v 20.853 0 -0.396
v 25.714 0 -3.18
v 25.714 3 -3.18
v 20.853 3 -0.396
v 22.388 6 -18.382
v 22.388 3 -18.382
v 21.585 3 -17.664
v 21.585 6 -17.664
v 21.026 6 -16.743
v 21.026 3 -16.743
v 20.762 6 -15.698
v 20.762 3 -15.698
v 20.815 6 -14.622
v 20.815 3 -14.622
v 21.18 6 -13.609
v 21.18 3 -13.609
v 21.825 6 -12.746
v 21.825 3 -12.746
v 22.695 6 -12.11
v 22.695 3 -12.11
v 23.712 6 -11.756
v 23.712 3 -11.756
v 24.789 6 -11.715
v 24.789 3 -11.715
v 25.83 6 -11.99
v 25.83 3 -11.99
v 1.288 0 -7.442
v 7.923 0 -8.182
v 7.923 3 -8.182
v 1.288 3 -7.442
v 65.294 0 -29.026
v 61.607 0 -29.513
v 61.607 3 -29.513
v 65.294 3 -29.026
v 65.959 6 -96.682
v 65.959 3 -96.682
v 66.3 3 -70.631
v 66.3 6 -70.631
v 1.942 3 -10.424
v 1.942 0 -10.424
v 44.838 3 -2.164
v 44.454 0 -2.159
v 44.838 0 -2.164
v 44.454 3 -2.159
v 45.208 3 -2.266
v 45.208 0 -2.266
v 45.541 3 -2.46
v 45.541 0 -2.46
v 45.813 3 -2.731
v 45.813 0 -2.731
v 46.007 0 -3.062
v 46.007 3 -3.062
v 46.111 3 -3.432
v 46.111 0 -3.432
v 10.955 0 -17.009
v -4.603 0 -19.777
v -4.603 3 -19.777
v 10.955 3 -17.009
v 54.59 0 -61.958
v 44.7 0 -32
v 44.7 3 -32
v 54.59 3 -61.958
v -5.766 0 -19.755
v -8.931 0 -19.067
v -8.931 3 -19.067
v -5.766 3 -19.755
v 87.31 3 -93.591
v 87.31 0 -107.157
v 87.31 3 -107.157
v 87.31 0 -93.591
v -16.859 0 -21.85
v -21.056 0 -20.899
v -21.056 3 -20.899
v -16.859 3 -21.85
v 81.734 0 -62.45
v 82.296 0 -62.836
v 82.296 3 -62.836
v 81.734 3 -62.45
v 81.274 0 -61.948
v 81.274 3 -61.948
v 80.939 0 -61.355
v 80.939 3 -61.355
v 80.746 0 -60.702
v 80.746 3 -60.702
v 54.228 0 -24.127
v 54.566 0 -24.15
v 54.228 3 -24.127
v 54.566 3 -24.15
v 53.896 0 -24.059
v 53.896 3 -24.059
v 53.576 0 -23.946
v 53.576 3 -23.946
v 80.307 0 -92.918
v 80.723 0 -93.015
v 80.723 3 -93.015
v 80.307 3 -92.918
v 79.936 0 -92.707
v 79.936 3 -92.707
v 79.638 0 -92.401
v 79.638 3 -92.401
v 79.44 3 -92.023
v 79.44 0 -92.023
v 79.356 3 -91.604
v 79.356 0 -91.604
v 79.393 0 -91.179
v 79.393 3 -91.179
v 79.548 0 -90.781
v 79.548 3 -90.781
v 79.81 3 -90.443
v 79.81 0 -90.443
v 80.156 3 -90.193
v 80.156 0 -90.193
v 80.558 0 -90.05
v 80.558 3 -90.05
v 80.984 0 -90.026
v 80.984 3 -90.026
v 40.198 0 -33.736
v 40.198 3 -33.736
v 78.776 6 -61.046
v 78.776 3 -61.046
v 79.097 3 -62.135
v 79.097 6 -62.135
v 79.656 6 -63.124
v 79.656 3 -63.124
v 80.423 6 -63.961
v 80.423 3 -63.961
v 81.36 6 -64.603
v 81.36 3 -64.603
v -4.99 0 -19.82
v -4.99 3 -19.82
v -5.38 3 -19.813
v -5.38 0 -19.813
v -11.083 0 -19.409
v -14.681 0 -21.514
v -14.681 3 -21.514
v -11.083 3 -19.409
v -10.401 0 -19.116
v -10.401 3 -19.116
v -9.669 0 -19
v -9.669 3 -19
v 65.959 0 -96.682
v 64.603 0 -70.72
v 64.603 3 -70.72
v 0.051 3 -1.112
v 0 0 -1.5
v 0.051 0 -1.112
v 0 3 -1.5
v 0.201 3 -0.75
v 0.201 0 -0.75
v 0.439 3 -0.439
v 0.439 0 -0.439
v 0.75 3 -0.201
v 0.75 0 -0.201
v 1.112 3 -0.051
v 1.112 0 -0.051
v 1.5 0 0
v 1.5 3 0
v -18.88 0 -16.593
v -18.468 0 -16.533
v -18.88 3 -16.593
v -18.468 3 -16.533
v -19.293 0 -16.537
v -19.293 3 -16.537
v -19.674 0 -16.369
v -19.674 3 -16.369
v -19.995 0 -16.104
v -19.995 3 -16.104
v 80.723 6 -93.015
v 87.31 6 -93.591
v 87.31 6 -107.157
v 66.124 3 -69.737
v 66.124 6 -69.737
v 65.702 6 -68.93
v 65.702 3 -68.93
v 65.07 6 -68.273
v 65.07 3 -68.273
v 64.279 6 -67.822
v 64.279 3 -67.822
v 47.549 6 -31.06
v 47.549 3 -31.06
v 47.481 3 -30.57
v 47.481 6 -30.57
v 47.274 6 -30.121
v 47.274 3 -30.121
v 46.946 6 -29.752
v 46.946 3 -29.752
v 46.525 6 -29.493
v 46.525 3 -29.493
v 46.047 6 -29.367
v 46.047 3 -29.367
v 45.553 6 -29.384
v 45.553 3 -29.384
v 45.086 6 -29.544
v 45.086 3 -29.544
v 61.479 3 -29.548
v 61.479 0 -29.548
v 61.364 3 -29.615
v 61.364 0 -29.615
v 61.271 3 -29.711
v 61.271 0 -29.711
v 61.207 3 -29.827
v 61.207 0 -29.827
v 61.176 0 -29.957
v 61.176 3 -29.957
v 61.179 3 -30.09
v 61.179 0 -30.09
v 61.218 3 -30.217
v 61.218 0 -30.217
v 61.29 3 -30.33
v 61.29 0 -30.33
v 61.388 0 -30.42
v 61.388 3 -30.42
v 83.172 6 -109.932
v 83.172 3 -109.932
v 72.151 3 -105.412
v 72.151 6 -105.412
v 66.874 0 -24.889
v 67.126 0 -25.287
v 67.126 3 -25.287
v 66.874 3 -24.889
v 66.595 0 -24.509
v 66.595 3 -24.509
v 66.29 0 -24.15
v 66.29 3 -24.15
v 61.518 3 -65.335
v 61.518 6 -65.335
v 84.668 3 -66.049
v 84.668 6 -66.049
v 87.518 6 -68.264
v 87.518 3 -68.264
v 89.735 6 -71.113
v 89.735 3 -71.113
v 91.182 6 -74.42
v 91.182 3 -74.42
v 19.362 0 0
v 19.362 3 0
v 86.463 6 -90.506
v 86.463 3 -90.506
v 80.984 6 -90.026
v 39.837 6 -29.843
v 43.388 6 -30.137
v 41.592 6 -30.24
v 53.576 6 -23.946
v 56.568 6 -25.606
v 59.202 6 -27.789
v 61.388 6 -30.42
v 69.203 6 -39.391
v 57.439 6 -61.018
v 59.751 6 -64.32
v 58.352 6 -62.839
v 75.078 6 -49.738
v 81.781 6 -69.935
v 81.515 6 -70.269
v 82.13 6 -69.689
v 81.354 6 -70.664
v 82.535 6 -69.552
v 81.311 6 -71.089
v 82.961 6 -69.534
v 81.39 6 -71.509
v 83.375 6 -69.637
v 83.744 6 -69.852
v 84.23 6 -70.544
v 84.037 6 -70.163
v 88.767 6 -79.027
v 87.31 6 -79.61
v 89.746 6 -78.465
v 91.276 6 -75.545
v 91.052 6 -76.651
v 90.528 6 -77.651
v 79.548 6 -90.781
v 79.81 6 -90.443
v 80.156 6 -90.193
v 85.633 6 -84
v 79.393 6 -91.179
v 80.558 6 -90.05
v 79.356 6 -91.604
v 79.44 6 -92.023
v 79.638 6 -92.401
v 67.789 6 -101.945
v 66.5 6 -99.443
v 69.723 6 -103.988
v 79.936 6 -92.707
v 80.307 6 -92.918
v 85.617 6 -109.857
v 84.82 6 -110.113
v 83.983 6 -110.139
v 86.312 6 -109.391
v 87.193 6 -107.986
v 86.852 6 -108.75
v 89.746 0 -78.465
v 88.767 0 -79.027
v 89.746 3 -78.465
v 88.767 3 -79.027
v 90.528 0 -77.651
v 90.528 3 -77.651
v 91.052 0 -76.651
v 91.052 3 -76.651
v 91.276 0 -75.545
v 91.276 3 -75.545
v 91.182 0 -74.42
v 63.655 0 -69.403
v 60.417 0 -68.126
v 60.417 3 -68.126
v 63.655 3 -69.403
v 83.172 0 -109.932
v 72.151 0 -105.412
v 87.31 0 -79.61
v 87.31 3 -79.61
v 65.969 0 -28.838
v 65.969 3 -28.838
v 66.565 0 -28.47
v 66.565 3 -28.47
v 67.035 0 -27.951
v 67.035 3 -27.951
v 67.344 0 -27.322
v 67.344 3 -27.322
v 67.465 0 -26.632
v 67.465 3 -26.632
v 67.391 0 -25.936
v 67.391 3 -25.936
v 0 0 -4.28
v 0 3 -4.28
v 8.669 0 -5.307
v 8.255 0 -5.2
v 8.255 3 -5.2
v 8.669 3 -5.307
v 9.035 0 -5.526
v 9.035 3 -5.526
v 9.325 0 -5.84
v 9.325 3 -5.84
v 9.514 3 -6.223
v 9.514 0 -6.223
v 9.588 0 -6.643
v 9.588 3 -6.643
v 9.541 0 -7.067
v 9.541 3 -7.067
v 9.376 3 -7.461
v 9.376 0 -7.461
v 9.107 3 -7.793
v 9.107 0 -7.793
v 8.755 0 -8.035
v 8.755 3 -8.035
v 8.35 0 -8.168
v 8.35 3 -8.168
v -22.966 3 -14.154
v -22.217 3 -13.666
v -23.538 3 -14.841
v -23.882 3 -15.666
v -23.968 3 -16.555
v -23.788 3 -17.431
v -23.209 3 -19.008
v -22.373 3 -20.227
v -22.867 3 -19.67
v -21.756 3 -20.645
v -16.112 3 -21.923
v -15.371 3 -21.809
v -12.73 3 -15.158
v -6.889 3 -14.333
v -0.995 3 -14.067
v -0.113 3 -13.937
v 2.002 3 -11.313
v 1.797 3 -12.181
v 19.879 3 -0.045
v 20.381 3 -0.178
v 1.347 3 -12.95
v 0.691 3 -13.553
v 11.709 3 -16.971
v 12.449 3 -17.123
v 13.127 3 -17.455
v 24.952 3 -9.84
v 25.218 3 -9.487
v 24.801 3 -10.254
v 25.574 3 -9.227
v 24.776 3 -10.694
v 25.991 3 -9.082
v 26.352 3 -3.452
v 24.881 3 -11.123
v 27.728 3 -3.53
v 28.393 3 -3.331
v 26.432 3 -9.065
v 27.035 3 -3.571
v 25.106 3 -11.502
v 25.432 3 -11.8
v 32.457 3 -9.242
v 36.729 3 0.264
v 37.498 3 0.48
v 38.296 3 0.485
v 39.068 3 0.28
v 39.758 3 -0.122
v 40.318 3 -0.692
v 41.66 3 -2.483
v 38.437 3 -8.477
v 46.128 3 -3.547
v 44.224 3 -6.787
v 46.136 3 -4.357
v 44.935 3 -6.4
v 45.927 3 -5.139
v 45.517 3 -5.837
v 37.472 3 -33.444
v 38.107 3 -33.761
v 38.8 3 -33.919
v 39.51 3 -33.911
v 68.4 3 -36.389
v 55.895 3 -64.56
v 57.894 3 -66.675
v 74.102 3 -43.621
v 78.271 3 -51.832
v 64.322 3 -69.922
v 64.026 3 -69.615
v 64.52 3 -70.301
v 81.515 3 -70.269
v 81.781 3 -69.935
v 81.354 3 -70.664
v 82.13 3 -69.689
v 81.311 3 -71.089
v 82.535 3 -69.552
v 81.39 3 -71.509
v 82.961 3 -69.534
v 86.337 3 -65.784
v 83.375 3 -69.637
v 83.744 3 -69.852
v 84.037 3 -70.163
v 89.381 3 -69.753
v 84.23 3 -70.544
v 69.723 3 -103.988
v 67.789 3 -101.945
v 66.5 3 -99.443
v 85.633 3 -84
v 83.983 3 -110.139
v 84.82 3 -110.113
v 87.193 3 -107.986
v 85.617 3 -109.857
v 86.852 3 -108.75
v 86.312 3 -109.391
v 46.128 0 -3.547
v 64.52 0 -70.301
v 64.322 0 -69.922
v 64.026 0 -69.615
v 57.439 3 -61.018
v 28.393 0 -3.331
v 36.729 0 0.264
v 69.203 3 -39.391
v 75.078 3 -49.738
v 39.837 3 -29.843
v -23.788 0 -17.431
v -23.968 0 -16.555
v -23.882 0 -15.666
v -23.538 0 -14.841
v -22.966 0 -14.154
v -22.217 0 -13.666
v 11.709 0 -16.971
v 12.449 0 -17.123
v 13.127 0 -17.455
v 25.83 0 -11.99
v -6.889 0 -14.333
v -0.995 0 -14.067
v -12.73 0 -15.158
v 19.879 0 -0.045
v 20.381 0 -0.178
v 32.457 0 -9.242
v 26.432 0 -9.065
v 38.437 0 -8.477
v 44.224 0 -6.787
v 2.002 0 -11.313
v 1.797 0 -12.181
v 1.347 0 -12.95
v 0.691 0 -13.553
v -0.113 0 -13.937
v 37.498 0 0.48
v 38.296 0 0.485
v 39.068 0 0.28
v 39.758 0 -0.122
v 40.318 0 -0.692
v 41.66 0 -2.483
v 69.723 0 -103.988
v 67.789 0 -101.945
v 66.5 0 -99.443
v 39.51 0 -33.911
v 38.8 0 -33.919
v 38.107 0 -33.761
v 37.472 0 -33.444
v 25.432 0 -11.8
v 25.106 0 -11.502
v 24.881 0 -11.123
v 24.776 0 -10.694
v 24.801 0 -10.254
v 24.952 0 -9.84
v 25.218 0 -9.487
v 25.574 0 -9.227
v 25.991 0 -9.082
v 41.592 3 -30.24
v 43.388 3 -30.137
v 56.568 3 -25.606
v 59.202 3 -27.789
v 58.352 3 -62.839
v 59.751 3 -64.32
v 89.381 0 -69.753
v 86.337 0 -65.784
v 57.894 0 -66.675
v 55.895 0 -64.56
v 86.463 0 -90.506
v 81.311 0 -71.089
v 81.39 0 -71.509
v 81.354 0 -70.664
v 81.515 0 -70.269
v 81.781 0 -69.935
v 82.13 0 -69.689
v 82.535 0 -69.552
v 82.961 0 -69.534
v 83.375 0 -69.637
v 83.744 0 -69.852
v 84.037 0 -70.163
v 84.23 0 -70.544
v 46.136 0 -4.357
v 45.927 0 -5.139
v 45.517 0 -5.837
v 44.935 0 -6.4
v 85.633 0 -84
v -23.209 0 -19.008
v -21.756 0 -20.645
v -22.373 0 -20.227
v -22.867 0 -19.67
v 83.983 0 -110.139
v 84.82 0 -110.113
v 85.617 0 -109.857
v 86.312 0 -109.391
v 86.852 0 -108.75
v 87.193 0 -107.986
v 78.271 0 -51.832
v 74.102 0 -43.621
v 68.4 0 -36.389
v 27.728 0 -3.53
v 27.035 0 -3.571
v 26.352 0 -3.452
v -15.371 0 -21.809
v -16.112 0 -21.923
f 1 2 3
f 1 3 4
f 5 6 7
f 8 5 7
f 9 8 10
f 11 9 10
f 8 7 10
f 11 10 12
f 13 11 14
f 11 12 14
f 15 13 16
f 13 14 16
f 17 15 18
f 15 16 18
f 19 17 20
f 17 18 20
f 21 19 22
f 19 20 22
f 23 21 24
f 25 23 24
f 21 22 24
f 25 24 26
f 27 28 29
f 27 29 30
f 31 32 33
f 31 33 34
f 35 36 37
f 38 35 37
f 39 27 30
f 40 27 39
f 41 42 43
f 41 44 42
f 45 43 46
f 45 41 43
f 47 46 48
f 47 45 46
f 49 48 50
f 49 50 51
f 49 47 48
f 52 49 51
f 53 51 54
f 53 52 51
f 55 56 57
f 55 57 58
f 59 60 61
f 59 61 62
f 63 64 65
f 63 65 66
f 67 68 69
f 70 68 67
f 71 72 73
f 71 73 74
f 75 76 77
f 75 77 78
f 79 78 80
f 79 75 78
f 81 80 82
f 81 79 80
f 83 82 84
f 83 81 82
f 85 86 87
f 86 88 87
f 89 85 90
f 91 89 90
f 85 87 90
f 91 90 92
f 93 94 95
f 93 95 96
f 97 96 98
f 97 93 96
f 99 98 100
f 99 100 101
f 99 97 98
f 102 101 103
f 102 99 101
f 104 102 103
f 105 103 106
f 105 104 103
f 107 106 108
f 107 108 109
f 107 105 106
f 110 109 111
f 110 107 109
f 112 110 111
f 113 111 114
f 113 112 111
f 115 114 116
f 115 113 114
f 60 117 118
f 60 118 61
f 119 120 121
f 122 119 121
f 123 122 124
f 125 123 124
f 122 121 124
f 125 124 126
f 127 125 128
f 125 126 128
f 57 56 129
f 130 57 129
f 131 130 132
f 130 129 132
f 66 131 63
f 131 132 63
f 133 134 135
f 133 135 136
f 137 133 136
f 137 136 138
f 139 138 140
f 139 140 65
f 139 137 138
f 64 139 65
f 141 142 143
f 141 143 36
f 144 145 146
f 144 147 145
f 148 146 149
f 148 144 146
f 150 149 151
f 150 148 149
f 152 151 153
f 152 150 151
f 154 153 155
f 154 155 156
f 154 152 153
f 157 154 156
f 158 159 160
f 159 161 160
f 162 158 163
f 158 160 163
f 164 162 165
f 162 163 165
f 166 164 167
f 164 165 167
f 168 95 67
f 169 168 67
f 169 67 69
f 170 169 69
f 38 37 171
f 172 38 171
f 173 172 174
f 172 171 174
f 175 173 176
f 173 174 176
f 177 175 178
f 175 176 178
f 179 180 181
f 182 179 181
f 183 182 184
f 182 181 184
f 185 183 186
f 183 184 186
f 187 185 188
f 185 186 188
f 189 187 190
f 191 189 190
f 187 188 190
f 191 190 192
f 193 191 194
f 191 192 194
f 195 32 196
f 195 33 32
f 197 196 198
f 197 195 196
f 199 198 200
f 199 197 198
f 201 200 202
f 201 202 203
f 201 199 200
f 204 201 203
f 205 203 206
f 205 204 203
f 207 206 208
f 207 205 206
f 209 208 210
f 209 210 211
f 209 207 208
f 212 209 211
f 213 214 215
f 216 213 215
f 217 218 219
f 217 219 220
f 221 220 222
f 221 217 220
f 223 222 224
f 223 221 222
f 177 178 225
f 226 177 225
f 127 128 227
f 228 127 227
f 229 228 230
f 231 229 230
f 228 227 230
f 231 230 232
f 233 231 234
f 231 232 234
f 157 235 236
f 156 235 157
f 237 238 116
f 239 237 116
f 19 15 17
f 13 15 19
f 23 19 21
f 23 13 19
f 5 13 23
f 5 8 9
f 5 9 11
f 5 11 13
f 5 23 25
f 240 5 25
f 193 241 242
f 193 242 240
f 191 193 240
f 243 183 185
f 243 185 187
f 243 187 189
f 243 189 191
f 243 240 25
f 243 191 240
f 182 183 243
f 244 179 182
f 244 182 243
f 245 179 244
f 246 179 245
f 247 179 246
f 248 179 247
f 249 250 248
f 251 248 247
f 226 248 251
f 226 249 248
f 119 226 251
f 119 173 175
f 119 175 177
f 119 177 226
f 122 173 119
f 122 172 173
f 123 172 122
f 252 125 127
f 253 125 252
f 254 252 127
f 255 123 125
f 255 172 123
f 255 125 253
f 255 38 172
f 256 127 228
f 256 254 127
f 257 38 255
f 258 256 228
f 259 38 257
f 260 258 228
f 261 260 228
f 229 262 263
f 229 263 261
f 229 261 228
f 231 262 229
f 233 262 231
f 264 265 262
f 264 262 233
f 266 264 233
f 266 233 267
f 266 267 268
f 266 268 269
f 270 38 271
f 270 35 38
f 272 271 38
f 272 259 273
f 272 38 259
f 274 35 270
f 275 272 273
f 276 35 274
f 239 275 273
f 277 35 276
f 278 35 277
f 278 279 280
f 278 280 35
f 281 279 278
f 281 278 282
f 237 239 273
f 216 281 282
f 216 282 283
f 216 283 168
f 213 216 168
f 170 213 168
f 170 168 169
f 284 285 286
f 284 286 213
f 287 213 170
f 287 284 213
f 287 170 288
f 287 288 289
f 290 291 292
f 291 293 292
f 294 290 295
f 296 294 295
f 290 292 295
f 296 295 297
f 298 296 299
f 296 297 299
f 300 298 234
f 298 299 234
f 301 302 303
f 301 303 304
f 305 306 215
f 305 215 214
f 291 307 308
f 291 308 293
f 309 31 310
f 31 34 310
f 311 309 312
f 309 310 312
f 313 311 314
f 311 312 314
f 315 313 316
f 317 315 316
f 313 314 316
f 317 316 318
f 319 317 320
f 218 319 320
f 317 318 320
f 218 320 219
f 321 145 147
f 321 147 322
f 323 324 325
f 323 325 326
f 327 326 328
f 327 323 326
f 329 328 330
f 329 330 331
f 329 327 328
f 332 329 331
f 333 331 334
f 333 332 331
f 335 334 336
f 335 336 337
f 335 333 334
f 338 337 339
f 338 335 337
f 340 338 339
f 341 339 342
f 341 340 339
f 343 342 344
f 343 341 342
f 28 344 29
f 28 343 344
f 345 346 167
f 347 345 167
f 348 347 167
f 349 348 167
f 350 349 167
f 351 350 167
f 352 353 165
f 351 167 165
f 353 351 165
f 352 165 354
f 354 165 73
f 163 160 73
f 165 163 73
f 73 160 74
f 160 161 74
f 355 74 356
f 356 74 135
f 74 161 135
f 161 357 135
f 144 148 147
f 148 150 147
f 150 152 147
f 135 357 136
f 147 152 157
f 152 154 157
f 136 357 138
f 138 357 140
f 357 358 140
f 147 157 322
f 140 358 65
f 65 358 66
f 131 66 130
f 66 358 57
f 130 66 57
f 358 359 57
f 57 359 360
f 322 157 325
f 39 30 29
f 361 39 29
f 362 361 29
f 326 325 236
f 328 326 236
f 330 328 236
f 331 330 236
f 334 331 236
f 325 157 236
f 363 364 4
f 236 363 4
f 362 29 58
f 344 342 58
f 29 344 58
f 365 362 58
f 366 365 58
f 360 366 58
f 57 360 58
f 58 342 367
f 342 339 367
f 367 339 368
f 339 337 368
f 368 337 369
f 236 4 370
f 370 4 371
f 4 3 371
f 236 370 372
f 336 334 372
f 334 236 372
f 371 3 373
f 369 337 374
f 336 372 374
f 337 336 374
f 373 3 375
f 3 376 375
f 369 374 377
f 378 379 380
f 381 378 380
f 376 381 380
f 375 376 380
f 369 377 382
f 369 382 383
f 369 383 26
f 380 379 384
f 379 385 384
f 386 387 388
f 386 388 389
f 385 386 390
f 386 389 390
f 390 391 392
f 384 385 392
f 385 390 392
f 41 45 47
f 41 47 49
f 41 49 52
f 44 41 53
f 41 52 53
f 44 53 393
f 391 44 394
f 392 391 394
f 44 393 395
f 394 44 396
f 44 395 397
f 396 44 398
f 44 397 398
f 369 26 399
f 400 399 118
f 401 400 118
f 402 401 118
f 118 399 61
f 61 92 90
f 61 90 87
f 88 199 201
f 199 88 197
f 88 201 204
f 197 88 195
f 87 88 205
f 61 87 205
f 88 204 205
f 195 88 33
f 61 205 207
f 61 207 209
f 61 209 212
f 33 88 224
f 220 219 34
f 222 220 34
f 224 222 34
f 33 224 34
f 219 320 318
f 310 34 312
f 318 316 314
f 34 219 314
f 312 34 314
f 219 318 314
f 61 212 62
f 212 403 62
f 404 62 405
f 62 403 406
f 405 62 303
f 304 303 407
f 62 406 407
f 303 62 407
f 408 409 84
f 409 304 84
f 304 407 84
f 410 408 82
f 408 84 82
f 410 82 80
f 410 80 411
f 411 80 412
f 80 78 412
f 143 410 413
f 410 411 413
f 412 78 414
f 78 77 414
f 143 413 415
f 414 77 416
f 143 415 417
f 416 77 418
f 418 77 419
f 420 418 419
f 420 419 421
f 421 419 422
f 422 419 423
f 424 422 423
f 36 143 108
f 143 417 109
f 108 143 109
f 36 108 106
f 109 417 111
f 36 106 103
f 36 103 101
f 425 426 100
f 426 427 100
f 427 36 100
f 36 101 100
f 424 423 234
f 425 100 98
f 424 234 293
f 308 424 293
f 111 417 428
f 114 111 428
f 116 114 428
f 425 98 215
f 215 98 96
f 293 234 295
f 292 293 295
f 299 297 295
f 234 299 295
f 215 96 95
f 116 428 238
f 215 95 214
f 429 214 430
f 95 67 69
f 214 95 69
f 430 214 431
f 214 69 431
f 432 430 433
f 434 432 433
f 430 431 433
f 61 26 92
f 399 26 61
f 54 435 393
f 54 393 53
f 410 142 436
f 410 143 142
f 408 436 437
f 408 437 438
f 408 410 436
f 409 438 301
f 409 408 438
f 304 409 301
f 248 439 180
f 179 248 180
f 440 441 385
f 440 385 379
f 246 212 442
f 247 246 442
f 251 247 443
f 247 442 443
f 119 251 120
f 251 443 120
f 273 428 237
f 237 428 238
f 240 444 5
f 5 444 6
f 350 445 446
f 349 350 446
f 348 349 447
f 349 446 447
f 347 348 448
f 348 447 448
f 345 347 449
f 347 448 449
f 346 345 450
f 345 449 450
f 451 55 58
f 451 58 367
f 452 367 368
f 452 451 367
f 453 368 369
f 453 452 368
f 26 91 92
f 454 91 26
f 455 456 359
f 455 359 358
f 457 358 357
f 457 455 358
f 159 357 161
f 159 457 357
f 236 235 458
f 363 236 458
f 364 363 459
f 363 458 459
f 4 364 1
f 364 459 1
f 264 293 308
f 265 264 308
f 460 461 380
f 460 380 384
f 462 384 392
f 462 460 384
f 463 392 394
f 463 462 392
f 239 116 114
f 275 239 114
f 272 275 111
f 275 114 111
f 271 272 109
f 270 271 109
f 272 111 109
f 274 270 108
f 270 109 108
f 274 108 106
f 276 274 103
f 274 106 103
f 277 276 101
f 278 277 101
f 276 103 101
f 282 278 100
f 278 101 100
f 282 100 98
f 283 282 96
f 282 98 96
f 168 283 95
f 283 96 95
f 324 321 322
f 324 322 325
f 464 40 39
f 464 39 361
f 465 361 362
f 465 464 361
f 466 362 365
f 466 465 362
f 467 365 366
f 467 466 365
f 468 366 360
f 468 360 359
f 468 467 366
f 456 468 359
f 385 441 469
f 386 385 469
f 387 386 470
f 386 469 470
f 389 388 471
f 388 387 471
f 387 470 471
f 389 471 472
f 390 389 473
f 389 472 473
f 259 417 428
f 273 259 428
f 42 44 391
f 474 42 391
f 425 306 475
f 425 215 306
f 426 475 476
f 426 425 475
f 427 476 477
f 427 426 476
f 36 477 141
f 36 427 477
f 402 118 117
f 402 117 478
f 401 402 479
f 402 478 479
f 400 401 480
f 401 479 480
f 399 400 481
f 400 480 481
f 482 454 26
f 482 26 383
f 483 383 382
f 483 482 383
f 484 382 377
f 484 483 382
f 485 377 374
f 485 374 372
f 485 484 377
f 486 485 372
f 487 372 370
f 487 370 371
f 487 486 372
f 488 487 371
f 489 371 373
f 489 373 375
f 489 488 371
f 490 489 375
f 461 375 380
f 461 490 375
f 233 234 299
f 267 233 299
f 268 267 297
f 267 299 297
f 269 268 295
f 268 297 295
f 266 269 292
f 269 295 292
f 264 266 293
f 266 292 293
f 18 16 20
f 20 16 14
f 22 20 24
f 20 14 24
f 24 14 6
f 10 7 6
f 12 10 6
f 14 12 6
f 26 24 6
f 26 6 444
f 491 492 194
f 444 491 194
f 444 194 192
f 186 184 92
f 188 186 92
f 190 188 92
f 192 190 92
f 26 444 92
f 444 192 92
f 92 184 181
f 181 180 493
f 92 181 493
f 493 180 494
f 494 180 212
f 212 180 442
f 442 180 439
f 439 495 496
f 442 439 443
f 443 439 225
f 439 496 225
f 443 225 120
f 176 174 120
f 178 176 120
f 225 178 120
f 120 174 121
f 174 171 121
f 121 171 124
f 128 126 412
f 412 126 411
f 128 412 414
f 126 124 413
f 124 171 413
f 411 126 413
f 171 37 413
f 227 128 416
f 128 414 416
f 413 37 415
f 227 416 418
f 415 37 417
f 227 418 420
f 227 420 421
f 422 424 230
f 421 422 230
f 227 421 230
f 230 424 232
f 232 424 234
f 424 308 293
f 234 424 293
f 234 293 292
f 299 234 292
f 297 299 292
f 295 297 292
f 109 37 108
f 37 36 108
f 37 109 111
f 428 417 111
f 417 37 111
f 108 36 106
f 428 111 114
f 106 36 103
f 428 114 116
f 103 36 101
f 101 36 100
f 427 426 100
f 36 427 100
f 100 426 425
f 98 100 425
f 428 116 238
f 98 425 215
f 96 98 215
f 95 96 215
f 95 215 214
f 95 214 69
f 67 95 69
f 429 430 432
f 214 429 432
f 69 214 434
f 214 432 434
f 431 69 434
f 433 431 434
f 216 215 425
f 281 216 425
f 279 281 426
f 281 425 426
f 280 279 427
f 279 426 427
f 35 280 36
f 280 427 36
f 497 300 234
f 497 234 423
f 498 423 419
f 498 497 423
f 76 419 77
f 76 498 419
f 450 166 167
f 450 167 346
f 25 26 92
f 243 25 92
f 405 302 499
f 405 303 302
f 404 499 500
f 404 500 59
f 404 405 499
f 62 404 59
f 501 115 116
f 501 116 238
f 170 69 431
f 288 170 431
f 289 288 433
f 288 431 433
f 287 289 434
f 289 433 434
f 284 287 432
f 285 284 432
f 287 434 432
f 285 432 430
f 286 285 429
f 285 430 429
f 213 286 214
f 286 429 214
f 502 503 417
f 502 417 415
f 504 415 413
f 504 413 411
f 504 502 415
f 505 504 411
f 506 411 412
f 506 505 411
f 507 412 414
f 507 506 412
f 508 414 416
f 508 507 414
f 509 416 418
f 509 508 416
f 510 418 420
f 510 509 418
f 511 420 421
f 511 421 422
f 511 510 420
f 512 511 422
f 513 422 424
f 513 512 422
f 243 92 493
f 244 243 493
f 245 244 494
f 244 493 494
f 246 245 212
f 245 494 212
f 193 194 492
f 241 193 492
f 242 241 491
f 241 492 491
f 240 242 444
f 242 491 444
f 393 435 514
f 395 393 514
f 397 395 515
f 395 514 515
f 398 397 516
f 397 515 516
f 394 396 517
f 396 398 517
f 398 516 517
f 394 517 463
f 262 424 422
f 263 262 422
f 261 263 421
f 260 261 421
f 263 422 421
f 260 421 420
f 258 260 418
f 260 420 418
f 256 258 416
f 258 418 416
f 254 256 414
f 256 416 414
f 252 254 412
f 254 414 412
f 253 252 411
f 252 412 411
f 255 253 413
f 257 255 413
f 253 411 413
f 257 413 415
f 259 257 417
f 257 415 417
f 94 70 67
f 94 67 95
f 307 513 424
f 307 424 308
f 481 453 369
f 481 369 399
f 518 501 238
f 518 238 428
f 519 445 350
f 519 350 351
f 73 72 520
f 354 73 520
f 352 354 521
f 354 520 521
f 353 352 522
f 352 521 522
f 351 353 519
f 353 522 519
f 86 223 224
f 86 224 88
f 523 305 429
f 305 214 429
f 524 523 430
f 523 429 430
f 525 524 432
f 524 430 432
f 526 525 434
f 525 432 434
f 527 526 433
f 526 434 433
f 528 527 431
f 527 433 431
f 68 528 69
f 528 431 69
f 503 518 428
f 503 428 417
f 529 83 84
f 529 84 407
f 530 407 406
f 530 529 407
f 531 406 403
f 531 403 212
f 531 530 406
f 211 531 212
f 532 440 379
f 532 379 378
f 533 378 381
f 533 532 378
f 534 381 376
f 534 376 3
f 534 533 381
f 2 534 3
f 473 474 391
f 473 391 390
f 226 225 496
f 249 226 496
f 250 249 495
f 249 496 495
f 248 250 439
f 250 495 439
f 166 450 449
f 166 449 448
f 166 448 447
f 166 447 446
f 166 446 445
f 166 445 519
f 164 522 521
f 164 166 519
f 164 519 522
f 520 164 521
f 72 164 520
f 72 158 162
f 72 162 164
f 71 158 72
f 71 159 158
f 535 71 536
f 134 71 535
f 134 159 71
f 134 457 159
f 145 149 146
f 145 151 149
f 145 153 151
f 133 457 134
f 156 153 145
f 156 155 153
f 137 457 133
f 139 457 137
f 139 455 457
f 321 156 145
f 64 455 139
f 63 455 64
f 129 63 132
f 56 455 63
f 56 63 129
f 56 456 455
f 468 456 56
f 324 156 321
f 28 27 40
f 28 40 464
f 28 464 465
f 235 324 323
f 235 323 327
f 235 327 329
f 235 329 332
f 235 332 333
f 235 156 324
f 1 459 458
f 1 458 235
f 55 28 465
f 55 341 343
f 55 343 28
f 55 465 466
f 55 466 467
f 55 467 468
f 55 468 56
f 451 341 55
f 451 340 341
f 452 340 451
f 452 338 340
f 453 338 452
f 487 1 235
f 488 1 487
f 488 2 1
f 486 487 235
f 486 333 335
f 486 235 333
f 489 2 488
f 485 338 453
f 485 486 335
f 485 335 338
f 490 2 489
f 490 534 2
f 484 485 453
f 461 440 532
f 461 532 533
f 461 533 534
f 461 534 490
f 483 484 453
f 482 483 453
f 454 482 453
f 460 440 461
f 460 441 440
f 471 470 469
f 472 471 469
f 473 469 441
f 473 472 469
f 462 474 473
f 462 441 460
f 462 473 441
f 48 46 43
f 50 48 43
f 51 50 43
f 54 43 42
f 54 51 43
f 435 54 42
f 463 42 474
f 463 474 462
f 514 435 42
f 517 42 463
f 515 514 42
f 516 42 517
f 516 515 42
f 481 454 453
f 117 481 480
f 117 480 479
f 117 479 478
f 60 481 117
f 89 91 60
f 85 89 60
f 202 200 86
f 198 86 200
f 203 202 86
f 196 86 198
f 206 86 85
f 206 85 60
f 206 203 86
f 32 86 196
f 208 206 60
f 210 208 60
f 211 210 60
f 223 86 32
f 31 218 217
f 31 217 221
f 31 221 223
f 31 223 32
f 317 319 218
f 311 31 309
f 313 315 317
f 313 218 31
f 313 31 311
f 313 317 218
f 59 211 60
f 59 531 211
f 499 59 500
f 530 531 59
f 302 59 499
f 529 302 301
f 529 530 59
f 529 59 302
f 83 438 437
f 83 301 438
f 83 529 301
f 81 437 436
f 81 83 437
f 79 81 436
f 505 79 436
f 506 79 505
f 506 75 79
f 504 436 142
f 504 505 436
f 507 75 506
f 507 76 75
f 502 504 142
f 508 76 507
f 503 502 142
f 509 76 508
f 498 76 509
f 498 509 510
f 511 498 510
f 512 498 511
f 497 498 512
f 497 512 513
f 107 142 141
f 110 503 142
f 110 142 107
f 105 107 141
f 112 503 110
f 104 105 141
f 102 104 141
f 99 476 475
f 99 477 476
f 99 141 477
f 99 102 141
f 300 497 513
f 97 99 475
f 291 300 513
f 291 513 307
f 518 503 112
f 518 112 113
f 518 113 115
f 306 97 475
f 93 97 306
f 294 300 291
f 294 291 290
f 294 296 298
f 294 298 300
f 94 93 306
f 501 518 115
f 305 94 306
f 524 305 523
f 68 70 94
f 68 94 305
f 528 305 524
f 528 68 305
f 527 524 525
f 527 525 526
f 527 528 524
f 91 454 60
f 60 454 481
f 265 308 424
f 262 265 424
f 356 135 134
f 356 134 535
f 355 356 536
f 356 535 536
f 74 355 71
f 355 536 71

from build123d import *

# Parameters (mm, degrees)
BOSS_EXTRUDE1_DEPTH = 3
FILLET1_R           = 3
FILLET2_R           = 1.5
FILLET3_R           = 10
FILLET4_R           = 3
FILLET5_R           = 4
FILLET6_R           = 2.5
FILLET7_R           = 0.5
BOSS_EXTRUDE2_DEPTH = 3


with BuildPart() as part:
    # Sketch3 → Boss-Extrude1 (new body)
    with BuildSketch(Plane(origin=(0, 0, 0), x_dir=(1, 0, 0), z_dir=(0, 1, 0))):
        with BuildLine():
            Line((7.923093171, 8.181542538), (1.28839884, 7.442154357))
            Line((1.28839884, 7.442154357), (2.76822933, 14.19))
            ThreePointArc((2.76822933, 14.19), (-8.413807268, 14.494015924), (-19.359710867, 16.8))
            Line((-19.359710867, 16.8), (-22.216794933, 13.666296862))
            Line((-22.216794933, 13.666296862), (-24.820279869, 14.62298821))
            Line((-24.820279869, 14.62298821), (-22.646481841, 20.53863742))
            Line((-22.646481841, 20.53863742), (-15.703804617, 22.111794774))
            Line((-15.703804617, 22.111794774), (-10.073302156, 18.818482014))
            Line((-10.073302156, 18.818482014), (-5.186450964, 19.880840969))
            Line((-5.186450964, 19.880840969), (12.13, 16.8))
            Line((12.13, 16.8), (38.76, 34.29))
            Line((38.76, 34.29), (44.7, 32))
            Line((44.7, 32), (56.058554748, 66.4069852))
            Line((56.058554748, 66.4069852), (64.552315124, 69.756868371))
            Line((64.552315124, 69.756868371), (66.29, 103.00790875))
            Line((66.29, 103.00790875), (87.31, 111.63))
            Line((87.31, 111.63), (87.31, 93.591357519))
            Line((87.31, 93.591357519), (80.722672152, 93.01504101))
            ThreePointArc((80.722672152, 93.01504101), (79.359113719, 91.390015348), (80.984139381, 90.026456915))
            Line((80.984139381, 90.026456915), (86.46321022, 90.505813501))
            Line((86.46321022, 90.505813501), (85.632866314, 84))
            Line((85.632866314, 84), (81.389705108, 71.508585308))
            ThreePointArc((81.389705108, 71.508585308), (82.327545423, 69.605835839), (84.230294892, 70.543676154))
            Line((84.230294892, 70.543676154), (87.31, 79.61))
            Line((87.31, 79.61), (91.618486592, 77.887634392))
            ThreePointArc((91.618486592, 77.887634392), (88.600013238, 68.48894743), (80.984139381, 62.208424889))
            ThreePointArc((80.984139381, 62.208424889), (74.158506271, 43.709858628), (60.297831214, 29.686025056))
            Line((60.297831214, 29.686025056), (68.03871852, 28.66301442))
            ThreePointArc((68.03871852, 28.66301442), (67.586257486, 26.243028794), (66.29, 24.15))
            Line((66.29, 24.15), (54.05, 24.15))
            Line((54.05, 24.15), (25.830040494, 11.99))
            ThreePointArc((25.830040494, 11.99), (24.800734775, 10.253880031), (26.431506195, 9.064692331))
            ThreePointArc((26.431506195, 9.064692331), (36.664028635, 8.803570476), (46.46571567, 5.854056721))
            Line((46.46571567, 5.854056721), (45.9, 1.991540554))
            Line((45.9, 1.991540554), (41.660045255, 2.482673431))
            Line((41.660045255, 2.482673431), (38.9, -1.2))
            Line((38.9, -1.2), (27.015518097, 3.924692331))
            Line((27.015518097, 3.924692331), (20.16, 0))
            Line((20.16, 0), (0, 0))
            Line((0, 0), (0, 4.28))
            Line((0, 4.28), (8.255364291, 5.2))
            ThreePointArc((8.255364291, 5.2), (9.58, 6.856906829), (7.923093171, 8.181542538))
        make_face()
    extrude(amount=BOSS_EXTRUDE1_DEPTH)

    # Fillet1
    # the kernel refuses this fillet: 3 mm, written as the material it adds along each edge
    with BuildSketch(Plane(origin=(80.984139381, 0, -62.208424889), x_dir=(0.9022478681487618, 0, -0.4312177923289046), z_dir=(0, 1, 0))) as fillet1_piece_1:
        with BuildLine():
            CenterArc((1.578679862, -2.997421373), FILLET1_R, 92.37575888, 52.157589609)
            ThreePointArc((-0.864680258, -1.256734347), (-0.427200708, -0.631903288), (0, 0))
            ThreePointArc((0, 0), (0.72716053, -0.015077949), (1.45432106, 0))
        make_face()
    extrude(amount=3)
    with BuildSketch(Plane(origin=(27.015518097, 0, -3.924692331), x_dir=(0.9182659150547935, 0, 0.39596427774305953), z_dir=(0, 1, 0))) as fillet1_piece_2:
        with BuildLine():
            CenterArc((FILLET1_R * 0.49985366711, -FILLET1_R), FILLET1_R, 90, 53.116686758)
            Line((-FILLET1_R * 0.300005823165, -FILLET1_R * 0.399812699386), (0, 0))
            Line((0, 0), (FILLET1_R * 0.49985366711, 0))
        make_face()
    extrude(amount=3)
    with BuildSketch(Plane(origin=(12.13, 0, -16.8), x_dir=(-0.9845393680489544, 0, -0.17516344584919966), z_dir=(0, 1, 0))) as fillet1_piece_3:
        with BuildLine():
            CenterArc((FILLET1_R * 0.397788634748, -FILLET1_R), FILLET1_R, 90, 43.384200988)
            Line((-FILLET1_R * 0.289098500769, -FILLET1_R * 0.273235895863), (0, 0))
            Line((0, 0), (FILLET1_R * 0.397788634748, 0))
        make_face()
    extrude(amount=3)
    with BuildSketch(Plane(origin=(-10.073302156, 0, -18.818482014), x_dir=(-0.863187603129405, 0, -0.5048833150379528), z_dir=(0, 1, 0))) as fillet1_piece_4:
        with BuildLine():
            CenterArc((FILLET1_R * 0.389766900576, -FILLET1_R), FILLET1_R, 90, 42.58838059)
            Line((-FILLET1_R * 0.286959776942, -FILLET1_R * 0.263765659633), (0, 0))
            Line((0, 0), (FILLET1_R * 0.389766900576, 0))
        make_face()
    extrude(amount=3)
    with BuildSketch(Plane(origin=(2.76822933, 0, -14.19), x_dir=(-0.21421340809022724, 0, 0.9767868835085624), z_dir=(0, 1, 0))) as fillet1_piece_5:
        with BuildLine():
            CenterArc((3.855271405, -3), FILLET1_R, 90, 102.505548925)
            ThreePointArc((0.926446282, -3.649602493), (0.490902504, -1.81777488), (0, 0))
            Line((0, 0), (3.855271405, 0))
        make_face()
    extrude(amount=3)
    # the kernel refuses this fillet: 3 mm, written as the material it takes off along each edge
    with BuildSketch(Plane(origin=(-24.820279869, -7.478630688, -14.62298821), x_dir=(0.9386336815677853, 0, 0.3449156590044952), z_dir=(0, 1, 0))) as fillet1_2_piece_1:
        with BuildLine():
            CenterArc((3, 2.991452275), FILLET1_R, 180, 85.673811508)
            Line((0, 2.991452275), (0, 0))
            Line((0, 0), (2.773696477, 0))
        make_face()
    extrude(amount=17.957261376, mode=Mode.SUBTRACT)
    with BuildSketch(Plane(origin=(20.16, -1.994934097, 0), x_dir=(0.8678473261649016, 0, -0.4968309757537575), z_dir=(0, 1, 0))) as fillet1_2_piece_2:
        with BuildLine():
            CenterArc((FILLET1_R * 0.265991212876, FILLET1_R), FILLET1_R, 240.209440415, 29.790559585)
            Line((-FILLET1_R * 0.230839762878, FILLET1_R * 0.132152673835), (0, 0))
            Line((0, 0), (FILLET1_R * 0.265991212876, 0))
        make_face()
    extrude(amount=6.989868193, mode=Mode.SUBTRACT)
    with BuildSketch(Plane(origin=(46.46571567, -6.070952348, -5.854056721), x_dir=(-0.9233291277987619, 0, -0.38400953342121286), z_dir=(0, 1, 0))) as fillet1_2_piece_3:
        with BuildLine():
            CenterArc((2.333722575, 2.99850626), FILLET1_R, 194.249797413, 77.558344276)
            Line((-0.573972765, 2.260056662), (0, 0))
            ThreePointArc((0, 0), (1.21419047, -0.019160317), (2.428380939, 0))
        make_face()
    extrude(amount=15.141904695, mode=Mode.SUBTRACT)
    with BuildSketch(Plane(origin=(38.9, -5.909950036, 1.2), x_dir=(0.5997274231965581, 0, -0.8002043600643629), z_dir=(0, 1, 0))) as fillet1_2_piece_4:
        with BuildLine():
            CenterArc((FILLET1_R * 0.78799333809, FILLET1_R), FILLET1_R, 193.524251091, 76.475748909)
            Line((-FILLET1_R * 0.184277686804, FILLET1_R * 0.766143090435), (0, 0))
            Line((0, 0), (FILLET1_R * 0.78799333809, 0))
        make_face()
    extrude(amount=14.819900071, mode=Mode.SUBTRACT)
    with BuildSketch(Plane(origin=(38.76, -3.852720436, -34.29), x_dir=(-0.8358453893738872, 0, 0.5489649215226915), z_dir=(0, 1, 0))) as fillet1_2_piece_5:
        with BuildLine():
            CenterArc((FILLET1_R * 0.513696058133, FILLET1_R), FILLET1_R, 215.621225969, 54.378774031)
            Line((-FILLET1_R * 0.299188992069, FILLET1_R * 0.417575846005), (0, 0))
            Line((0, 0), (FILLET1_R * 0.513696058133, 0))
        make_face()
    extrude(amount=10.705440872, mode=Mode.SUBTRACT)
    with BuildSketch(Plane(origin=(-5.186450964, -1.481839662, -19.880840969), x_dir=(-0.9771763639228005, 0, 0.2124296443310458), z_dir=(0, 1, 0))) as fillet1_2_piece_6:
        with BuildLine():
            CenterArc((FILLET1_R * 0.197578621542, FILLET1_R), FILLET1_R, 247.647056489, 22.352943511)
            Line((-FILLET1_R * 0.18273230535, FILLET1_R * 0.0751413086926), (0, 0))
            Line((0, 0), (FILLET1_R * 0.197578621542, 0))
        make_face()
    extrude(amount=5.963679323, mode=Mode.SUBTRACT)
    with BuildSketch(Plane(origin=(-15.703804617, -2.961195523, -22.111794774), x_dir=(-0.975276058531981, 0, 0.22099006686800218), z_dir=(0, 1, 0))) as fillet1_2_piece_7:
        with BuildLine():
            CenterArc((FILLET1_R * 0.394826069747, FILLET1_R), FILLET1_R, 226.909202107, 43.090797893)
            Line((-FILLET1_R * 0.288330425897, FILLET1_R * 0.269727994197), (0, 0))
            Line((0, 0), (FILLET1_R * 0.394826069747, 0))
        make_face()
    extrude(amount=8.922391046, mode=Mode.SUBTRACT)
    with BuildSketch(Plane(origin=(-22.646481841, -4.076928403, -20.53863742), x_dir=(-0.3449156590044966, 0, 0.9386336815677849), z_dir=(0, 1, 0))) as fillet1_2_piece_8:
        with BuildLine():
            CenterArc((FILLET1_R * 0.543590453695, FILLET1_R), FILLET1_R, 212.943838396, 57.056161604)
            Line((-FILLET1_R * 0.295613569123, FILLET1_R * 0.456183295506), (0, 0))
            Line((0, 0), (FILLET1_R * 0.543590453695, 0))
        make_face()
    extrude(amount=11.153856805, mode=Mode.SUBTRACT)

    # Fillet2
    fillet2_edges = [part.edges().sort_by_distance(p)[0] for p in [
        (-19.359710867, 1.5, -16.8),
        (64.552315124, 1.5, -69.756868371),
        (45.9, 1.5, -1.991540554),
        (0, 1.5, 0),
    ]]
    fillet(fillet2_edges, radius=FILLET2_R)

    # Fillet3
    fillet3_edges = [part.edges().sort_by_distance(p)[0] for p in [
        (56.058554748, 1.5, -66.4069852),
        (66.29, 1.5, -103.00790875),
    ]]
    fillet(fillet3_edges, radius=FILLET3_R)

    # Fillet4
    fillet4_edges = [part.edges().sort_by_distance(p)[0] for p in [
        (87.31, 1.5, -111.63),
    ]]
    fillet(fillet4_edges, radius=FILLET4_R)

    # Fillet5
    fillet5_edges = [part.edges().sort_by_distance(p)[0] for p in [
        (91.618486592, 1.5, -77.887634392),
    ]]
    fillet(fillet5_edges, radius=FILLET5_R)

    # Fillet6
    fillet6_edges = [part.edges().sort_by_distance(p)[0] for p in [
        (68.03871852, 1.5, -28.66301442),
        (54.05, 1.5, -24.15),
    ]]
    fillet(fillet6_edges, radius=FILLET6_R)

    # Fillet7
    fillet7_edges = [part.edges().sort_by_distance(p)[0] for p in [
        (60.297831214, 1.5, -29.686025056),
    ]]
    fillet(fillet7_edges, radius=FILLET7_R)


with BuildPart() as body_2:
    # Sketch5 → Boss-Extrude2 (new body)
    with BuildSketch(Plane(origin=(0, 3, 0), x_dir=(1, 0, 0), z_dir=(0, 1, 0))):
        with BuildLine():
            Line((57.438647119, 61.017628386), (47.54878122, 31.059550342))
            ThreePointArc((47.54878122, 31.059550342), (46.745029323, 29.606678601), (45.085839693, 29.543883859))
            ThreePointArc((45.085839693, 29.543883859), (42.493298813, 30.251417888), (39.83722748, 29.84256866))
            Line((39.83722748, 29.84256866), (22.387718393, 18.382113763))
            ThreePointArc((22.387718393, 18.382113763), (21.1798426, 13.608693174), (25.830040494, 11.99))
            Line((25.830040494, 11.99), (53.576391709, 23.945921861))
            ThreePointArc((53.576391709, 23.945921861), (57.935166345, 26.636052739), (61.387868939, 30.41951217))
            ThreePointArc((61.387868939, 30.41951217), (72.399744721, 44.416938985), (78.775821887, 61.046280693))
            ThreePointArc((78.775821887, 61.046280693), (79.655985981, 63.123729699), (81.35980153, 64.602748217))
            ThreePointArc((81.35980153, 64.602748217), (87.51765004, 68.264170017), (91.181739197, 74.42043175))
            ThreePointArc((91.181739197, 74.42043175), (90.825596234, 77.169883499), (88.767430757, 79.027375787))
            Line((88.767430757, 79.027375787), (87.31, 79.61))
            Line((87.31, 79.61), (84.230294892, 70.543676154))
            ThreePointArc((84.230294892, 70.543676154), (82.327545423, 69.605835839), (81.389705108, 71.508585308))
            Line((81.389705108, 71.508585308), (85.632866314, 84))
            Line((85.632866314, 84), (86.46321022, 90.505813501))
            Line((86.46321022, 90.505813501), (80.984139381, 90.026456915))
            ThreePointArc((80.984139381, 90.026456915), (79.359113719, 91.390015348), (80.722672152, 93.01504101))
            Line((80.722672152, 93.01504101), (87.31, 93.591357519))
            Line((87.31, 93.591357519), (87.31, 107.156873665))
            ThreePointArc((87.31, 107.156873665), (85.981002826, 109.648409247), (83.171500296, 109.932448997))
            Line((83.171500296, 109.932448997), (72.150777993, 105.411912682))
            ThreePointArc((72.150777993, 105.411912682), (67.78888265, 101.944895464), (65.959404411, 96.681878387))
            Line((65.959404411, 96.681878387), (66.300336526, 70.631379716))
            ThreePointArc((66.300336526, 70.631379716), (65.702262854, 68.929518291), (64.278745649, 67.821536706))
            Line((64.278745649, 67.821536706), (61.517572524, 65.335095872))
            ThreePointArc((61.517572524, 65.335095872), (58.997486234, 63.630431041), (57.438647119, 61.017628386))
        make_face()
    extrude(amount=BOSS_EXTRUDE2_DEPTH)


solid = Compound([part.part, body_2.part])
